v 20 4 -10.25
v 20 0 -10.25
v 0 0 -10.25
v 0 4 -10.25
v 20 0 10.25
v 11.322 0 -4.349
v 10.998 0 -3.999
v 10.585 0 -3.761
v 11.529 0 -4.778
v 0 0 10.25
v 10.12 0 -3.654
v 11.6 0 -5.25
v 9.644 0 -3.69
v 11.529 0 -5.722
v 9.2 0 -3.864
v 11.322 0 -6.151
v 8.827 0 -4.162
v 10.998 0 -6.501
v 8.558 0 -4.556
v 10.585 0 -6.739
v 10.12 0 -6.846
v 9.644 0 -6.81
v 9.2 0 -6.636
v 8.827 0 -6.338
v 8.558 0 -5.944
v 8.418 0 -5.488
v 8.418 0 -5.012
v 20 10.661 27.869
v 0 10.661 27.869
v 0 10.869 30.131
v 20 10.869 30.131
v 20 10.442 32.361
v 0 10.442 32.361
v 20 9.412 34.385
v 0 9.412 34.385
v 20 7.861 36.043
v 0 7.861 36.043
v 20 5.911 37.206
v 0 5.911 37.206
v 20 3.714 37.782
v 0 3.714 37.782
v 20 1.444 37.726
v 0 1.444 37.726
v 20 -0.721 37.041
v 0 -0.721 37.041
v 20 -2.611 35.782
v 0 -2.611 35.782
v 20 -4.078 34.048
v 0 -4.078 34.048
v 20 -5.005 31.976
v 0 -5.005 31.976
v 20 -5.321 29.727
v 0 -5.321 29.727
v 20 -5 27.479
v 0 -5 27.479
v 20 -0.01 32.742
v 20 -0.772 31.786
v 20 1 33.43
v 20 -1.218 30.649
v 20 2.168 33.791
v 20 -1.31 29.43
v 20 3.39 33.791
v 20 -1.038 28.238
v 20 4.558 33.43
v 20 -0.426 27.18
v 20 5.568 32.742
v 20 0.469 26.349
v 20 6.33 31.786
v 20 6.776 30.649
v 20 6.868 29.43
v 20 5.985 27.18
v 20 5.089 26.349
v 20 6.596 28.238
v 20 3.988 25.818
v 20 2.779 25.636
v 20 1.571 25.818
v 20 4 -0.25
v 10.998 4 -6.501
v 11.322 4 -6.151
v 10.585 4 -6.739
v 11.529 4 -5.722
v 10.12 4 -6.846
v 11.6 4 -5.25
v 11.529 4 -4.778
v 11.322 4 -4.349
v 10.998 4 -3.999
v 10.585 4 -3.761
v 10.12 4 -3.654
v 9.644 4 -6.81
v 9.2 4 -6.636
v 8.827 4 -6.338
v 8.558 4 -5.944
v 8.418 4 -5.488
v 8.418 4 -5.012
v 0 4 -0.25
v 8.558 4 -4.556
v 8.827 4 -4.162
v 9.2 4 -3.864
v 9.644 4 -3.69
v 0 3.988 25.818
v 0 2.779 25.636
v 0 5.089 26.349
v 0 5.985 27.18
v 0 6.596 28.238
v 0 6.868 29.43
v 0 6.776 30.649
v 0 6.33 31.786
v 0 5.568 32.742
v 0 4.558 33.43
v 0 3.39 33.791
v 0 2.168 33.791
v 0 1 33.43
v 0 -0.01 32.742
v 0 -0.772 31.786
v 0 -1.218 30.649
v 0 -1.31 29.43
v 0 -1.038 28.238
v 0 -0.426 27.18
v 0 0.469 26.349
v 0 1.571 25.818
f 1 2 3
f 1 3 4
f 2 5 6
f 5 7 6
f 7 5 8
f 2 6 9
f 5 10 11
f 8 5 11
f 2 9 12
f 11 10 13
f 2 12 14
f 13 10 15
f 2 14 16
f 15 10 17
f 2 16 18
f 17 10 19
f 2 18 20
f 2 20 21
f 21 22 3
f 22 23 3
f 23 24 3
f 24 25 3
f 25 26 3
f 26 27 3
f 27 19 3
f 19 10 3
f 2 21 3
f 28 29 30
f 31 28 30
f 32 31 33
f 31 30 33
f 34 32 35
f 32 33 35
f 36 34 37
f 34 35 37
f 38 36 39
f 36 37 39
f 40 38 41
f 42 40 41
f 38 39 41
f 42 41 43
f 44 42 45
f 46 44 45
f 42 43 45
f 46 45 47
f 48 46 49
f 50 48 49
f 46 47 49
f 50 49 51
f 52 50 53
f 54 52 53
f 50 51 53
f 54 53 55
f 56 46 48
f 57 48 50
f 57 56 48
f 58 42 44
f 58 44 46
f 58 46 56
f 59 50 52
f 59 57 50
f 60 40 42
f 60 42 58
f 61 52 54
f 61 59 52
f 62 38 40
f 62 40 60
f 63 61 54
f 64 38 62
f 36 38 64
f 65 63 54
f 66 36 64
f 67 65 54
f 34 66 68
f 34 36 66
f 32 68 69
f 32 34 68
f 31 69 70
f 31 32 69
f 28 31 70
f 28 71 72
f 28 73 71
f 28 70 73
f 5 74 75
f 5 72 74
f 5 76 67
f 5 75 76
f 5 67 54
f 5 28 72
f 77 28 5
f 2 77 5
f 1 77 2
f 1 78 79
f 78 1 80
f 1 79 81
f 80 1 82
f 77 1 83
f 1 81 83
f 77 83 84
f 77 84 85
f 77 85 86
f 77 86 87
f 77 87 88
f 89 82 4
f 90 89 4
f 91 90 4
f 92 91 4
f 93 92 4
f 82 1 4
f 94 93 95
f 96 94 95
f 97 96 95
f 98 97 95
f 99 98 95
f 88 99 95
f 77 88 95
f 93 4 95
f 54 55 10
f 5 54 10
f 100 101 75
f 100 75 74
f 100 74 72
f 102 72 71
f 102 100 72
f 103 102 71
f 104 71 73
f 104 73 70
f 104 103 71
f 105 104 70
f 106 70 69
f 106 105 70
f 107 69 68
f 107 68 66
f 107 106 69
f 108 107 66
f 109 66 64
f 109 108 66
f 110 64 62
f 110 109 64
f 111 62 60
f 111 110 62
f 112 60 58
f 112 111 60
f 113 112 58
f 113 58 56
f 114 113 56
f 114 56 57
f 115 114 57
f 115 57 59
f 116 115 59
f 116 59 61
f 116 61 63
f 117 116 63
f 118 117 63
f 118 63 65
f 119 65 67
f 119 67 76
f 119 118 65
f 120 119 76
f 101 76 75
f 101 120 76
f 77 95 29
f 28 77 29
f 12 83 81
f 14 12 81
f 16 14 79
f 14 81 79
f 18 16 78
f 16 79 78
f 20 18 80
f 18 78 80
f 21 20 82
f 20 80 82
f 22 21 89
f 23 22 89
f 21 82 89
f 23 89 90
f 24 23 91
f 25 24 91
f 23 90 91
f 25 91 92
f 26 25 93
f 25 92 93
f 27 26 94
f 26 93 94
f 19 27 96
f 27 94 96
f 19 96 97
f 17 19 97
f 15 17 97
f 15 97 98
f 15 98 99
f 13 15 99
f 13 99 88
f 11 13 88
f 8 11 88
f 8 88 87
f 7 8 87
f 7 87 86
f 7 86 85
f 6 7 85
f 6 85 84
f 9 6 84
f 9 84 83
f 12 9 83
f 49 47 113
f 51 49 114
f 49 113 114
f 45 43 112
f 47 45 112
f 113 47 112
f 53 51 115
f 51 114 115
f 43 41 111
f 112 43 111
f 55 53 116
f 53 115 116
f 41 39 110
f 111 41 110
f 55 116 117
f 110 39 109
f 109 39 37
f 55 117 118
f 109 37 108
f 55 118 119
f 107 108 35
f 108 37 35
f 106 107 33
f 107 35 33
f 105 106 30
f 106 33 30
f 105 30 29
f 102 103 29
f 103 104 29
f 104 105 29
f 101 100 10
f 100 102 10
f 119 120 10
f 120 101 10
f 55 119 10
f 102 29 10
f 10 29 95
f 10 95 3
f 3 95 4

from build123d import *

# Parameters (mm, degrees)
SKETCH1_R           = 4.1
BOSS_EXTRUDE1_DEPTH = 20
SKETCH2_R           = 1.6
CUT_EXTRUDE1_DEPTH  = 10.320966192


with BuildPart() as part:
    # Sketch1 → Boss-Extrude1 (new body)
    with BuildSketch(Plane(origin=(0, 0, 0), x_dir=(0, 0, -1), z_dir=(1, 0, 0))):
        with BuildLine():
            Line((-10.25, 0), (10.25, 0))
            Line((10.25, 0), (10.25, 4))
            Line((10.25, 4), (0.25, 4))
            Line((0.25, 4), (-27.869263808, 10.660915614))
            ThreePointArc((-27.869263808, 10.660915614), (-37.833813874, 2.577122842), (-27.47875844, -5))
            Line((-27.47875844, -5), (-10.25, 0))
        make_face()
        with Locations((-29.736330811, 2.779033808)):
            Circle(SKETCH1_R, mode=Mode.SUBTRACT)
    extrude(amount=BOSS_EXTRUDE1_DEPTH)

    # Sketch2 → Cut-Extrude1 (cut, through all)
    with BuildSketch(Plane(origin=(0, 4, 0), x_dir=(1, 0, 0), z_dir=(0, 1, 0))):
        with Locations((10, 5.25)):
            Circle(SKETCH2_R)
    extrude(amount=-CUT_EXTRUDE1_DEPTH, mode=Mode.SUBTRACT)


solid = part.part
